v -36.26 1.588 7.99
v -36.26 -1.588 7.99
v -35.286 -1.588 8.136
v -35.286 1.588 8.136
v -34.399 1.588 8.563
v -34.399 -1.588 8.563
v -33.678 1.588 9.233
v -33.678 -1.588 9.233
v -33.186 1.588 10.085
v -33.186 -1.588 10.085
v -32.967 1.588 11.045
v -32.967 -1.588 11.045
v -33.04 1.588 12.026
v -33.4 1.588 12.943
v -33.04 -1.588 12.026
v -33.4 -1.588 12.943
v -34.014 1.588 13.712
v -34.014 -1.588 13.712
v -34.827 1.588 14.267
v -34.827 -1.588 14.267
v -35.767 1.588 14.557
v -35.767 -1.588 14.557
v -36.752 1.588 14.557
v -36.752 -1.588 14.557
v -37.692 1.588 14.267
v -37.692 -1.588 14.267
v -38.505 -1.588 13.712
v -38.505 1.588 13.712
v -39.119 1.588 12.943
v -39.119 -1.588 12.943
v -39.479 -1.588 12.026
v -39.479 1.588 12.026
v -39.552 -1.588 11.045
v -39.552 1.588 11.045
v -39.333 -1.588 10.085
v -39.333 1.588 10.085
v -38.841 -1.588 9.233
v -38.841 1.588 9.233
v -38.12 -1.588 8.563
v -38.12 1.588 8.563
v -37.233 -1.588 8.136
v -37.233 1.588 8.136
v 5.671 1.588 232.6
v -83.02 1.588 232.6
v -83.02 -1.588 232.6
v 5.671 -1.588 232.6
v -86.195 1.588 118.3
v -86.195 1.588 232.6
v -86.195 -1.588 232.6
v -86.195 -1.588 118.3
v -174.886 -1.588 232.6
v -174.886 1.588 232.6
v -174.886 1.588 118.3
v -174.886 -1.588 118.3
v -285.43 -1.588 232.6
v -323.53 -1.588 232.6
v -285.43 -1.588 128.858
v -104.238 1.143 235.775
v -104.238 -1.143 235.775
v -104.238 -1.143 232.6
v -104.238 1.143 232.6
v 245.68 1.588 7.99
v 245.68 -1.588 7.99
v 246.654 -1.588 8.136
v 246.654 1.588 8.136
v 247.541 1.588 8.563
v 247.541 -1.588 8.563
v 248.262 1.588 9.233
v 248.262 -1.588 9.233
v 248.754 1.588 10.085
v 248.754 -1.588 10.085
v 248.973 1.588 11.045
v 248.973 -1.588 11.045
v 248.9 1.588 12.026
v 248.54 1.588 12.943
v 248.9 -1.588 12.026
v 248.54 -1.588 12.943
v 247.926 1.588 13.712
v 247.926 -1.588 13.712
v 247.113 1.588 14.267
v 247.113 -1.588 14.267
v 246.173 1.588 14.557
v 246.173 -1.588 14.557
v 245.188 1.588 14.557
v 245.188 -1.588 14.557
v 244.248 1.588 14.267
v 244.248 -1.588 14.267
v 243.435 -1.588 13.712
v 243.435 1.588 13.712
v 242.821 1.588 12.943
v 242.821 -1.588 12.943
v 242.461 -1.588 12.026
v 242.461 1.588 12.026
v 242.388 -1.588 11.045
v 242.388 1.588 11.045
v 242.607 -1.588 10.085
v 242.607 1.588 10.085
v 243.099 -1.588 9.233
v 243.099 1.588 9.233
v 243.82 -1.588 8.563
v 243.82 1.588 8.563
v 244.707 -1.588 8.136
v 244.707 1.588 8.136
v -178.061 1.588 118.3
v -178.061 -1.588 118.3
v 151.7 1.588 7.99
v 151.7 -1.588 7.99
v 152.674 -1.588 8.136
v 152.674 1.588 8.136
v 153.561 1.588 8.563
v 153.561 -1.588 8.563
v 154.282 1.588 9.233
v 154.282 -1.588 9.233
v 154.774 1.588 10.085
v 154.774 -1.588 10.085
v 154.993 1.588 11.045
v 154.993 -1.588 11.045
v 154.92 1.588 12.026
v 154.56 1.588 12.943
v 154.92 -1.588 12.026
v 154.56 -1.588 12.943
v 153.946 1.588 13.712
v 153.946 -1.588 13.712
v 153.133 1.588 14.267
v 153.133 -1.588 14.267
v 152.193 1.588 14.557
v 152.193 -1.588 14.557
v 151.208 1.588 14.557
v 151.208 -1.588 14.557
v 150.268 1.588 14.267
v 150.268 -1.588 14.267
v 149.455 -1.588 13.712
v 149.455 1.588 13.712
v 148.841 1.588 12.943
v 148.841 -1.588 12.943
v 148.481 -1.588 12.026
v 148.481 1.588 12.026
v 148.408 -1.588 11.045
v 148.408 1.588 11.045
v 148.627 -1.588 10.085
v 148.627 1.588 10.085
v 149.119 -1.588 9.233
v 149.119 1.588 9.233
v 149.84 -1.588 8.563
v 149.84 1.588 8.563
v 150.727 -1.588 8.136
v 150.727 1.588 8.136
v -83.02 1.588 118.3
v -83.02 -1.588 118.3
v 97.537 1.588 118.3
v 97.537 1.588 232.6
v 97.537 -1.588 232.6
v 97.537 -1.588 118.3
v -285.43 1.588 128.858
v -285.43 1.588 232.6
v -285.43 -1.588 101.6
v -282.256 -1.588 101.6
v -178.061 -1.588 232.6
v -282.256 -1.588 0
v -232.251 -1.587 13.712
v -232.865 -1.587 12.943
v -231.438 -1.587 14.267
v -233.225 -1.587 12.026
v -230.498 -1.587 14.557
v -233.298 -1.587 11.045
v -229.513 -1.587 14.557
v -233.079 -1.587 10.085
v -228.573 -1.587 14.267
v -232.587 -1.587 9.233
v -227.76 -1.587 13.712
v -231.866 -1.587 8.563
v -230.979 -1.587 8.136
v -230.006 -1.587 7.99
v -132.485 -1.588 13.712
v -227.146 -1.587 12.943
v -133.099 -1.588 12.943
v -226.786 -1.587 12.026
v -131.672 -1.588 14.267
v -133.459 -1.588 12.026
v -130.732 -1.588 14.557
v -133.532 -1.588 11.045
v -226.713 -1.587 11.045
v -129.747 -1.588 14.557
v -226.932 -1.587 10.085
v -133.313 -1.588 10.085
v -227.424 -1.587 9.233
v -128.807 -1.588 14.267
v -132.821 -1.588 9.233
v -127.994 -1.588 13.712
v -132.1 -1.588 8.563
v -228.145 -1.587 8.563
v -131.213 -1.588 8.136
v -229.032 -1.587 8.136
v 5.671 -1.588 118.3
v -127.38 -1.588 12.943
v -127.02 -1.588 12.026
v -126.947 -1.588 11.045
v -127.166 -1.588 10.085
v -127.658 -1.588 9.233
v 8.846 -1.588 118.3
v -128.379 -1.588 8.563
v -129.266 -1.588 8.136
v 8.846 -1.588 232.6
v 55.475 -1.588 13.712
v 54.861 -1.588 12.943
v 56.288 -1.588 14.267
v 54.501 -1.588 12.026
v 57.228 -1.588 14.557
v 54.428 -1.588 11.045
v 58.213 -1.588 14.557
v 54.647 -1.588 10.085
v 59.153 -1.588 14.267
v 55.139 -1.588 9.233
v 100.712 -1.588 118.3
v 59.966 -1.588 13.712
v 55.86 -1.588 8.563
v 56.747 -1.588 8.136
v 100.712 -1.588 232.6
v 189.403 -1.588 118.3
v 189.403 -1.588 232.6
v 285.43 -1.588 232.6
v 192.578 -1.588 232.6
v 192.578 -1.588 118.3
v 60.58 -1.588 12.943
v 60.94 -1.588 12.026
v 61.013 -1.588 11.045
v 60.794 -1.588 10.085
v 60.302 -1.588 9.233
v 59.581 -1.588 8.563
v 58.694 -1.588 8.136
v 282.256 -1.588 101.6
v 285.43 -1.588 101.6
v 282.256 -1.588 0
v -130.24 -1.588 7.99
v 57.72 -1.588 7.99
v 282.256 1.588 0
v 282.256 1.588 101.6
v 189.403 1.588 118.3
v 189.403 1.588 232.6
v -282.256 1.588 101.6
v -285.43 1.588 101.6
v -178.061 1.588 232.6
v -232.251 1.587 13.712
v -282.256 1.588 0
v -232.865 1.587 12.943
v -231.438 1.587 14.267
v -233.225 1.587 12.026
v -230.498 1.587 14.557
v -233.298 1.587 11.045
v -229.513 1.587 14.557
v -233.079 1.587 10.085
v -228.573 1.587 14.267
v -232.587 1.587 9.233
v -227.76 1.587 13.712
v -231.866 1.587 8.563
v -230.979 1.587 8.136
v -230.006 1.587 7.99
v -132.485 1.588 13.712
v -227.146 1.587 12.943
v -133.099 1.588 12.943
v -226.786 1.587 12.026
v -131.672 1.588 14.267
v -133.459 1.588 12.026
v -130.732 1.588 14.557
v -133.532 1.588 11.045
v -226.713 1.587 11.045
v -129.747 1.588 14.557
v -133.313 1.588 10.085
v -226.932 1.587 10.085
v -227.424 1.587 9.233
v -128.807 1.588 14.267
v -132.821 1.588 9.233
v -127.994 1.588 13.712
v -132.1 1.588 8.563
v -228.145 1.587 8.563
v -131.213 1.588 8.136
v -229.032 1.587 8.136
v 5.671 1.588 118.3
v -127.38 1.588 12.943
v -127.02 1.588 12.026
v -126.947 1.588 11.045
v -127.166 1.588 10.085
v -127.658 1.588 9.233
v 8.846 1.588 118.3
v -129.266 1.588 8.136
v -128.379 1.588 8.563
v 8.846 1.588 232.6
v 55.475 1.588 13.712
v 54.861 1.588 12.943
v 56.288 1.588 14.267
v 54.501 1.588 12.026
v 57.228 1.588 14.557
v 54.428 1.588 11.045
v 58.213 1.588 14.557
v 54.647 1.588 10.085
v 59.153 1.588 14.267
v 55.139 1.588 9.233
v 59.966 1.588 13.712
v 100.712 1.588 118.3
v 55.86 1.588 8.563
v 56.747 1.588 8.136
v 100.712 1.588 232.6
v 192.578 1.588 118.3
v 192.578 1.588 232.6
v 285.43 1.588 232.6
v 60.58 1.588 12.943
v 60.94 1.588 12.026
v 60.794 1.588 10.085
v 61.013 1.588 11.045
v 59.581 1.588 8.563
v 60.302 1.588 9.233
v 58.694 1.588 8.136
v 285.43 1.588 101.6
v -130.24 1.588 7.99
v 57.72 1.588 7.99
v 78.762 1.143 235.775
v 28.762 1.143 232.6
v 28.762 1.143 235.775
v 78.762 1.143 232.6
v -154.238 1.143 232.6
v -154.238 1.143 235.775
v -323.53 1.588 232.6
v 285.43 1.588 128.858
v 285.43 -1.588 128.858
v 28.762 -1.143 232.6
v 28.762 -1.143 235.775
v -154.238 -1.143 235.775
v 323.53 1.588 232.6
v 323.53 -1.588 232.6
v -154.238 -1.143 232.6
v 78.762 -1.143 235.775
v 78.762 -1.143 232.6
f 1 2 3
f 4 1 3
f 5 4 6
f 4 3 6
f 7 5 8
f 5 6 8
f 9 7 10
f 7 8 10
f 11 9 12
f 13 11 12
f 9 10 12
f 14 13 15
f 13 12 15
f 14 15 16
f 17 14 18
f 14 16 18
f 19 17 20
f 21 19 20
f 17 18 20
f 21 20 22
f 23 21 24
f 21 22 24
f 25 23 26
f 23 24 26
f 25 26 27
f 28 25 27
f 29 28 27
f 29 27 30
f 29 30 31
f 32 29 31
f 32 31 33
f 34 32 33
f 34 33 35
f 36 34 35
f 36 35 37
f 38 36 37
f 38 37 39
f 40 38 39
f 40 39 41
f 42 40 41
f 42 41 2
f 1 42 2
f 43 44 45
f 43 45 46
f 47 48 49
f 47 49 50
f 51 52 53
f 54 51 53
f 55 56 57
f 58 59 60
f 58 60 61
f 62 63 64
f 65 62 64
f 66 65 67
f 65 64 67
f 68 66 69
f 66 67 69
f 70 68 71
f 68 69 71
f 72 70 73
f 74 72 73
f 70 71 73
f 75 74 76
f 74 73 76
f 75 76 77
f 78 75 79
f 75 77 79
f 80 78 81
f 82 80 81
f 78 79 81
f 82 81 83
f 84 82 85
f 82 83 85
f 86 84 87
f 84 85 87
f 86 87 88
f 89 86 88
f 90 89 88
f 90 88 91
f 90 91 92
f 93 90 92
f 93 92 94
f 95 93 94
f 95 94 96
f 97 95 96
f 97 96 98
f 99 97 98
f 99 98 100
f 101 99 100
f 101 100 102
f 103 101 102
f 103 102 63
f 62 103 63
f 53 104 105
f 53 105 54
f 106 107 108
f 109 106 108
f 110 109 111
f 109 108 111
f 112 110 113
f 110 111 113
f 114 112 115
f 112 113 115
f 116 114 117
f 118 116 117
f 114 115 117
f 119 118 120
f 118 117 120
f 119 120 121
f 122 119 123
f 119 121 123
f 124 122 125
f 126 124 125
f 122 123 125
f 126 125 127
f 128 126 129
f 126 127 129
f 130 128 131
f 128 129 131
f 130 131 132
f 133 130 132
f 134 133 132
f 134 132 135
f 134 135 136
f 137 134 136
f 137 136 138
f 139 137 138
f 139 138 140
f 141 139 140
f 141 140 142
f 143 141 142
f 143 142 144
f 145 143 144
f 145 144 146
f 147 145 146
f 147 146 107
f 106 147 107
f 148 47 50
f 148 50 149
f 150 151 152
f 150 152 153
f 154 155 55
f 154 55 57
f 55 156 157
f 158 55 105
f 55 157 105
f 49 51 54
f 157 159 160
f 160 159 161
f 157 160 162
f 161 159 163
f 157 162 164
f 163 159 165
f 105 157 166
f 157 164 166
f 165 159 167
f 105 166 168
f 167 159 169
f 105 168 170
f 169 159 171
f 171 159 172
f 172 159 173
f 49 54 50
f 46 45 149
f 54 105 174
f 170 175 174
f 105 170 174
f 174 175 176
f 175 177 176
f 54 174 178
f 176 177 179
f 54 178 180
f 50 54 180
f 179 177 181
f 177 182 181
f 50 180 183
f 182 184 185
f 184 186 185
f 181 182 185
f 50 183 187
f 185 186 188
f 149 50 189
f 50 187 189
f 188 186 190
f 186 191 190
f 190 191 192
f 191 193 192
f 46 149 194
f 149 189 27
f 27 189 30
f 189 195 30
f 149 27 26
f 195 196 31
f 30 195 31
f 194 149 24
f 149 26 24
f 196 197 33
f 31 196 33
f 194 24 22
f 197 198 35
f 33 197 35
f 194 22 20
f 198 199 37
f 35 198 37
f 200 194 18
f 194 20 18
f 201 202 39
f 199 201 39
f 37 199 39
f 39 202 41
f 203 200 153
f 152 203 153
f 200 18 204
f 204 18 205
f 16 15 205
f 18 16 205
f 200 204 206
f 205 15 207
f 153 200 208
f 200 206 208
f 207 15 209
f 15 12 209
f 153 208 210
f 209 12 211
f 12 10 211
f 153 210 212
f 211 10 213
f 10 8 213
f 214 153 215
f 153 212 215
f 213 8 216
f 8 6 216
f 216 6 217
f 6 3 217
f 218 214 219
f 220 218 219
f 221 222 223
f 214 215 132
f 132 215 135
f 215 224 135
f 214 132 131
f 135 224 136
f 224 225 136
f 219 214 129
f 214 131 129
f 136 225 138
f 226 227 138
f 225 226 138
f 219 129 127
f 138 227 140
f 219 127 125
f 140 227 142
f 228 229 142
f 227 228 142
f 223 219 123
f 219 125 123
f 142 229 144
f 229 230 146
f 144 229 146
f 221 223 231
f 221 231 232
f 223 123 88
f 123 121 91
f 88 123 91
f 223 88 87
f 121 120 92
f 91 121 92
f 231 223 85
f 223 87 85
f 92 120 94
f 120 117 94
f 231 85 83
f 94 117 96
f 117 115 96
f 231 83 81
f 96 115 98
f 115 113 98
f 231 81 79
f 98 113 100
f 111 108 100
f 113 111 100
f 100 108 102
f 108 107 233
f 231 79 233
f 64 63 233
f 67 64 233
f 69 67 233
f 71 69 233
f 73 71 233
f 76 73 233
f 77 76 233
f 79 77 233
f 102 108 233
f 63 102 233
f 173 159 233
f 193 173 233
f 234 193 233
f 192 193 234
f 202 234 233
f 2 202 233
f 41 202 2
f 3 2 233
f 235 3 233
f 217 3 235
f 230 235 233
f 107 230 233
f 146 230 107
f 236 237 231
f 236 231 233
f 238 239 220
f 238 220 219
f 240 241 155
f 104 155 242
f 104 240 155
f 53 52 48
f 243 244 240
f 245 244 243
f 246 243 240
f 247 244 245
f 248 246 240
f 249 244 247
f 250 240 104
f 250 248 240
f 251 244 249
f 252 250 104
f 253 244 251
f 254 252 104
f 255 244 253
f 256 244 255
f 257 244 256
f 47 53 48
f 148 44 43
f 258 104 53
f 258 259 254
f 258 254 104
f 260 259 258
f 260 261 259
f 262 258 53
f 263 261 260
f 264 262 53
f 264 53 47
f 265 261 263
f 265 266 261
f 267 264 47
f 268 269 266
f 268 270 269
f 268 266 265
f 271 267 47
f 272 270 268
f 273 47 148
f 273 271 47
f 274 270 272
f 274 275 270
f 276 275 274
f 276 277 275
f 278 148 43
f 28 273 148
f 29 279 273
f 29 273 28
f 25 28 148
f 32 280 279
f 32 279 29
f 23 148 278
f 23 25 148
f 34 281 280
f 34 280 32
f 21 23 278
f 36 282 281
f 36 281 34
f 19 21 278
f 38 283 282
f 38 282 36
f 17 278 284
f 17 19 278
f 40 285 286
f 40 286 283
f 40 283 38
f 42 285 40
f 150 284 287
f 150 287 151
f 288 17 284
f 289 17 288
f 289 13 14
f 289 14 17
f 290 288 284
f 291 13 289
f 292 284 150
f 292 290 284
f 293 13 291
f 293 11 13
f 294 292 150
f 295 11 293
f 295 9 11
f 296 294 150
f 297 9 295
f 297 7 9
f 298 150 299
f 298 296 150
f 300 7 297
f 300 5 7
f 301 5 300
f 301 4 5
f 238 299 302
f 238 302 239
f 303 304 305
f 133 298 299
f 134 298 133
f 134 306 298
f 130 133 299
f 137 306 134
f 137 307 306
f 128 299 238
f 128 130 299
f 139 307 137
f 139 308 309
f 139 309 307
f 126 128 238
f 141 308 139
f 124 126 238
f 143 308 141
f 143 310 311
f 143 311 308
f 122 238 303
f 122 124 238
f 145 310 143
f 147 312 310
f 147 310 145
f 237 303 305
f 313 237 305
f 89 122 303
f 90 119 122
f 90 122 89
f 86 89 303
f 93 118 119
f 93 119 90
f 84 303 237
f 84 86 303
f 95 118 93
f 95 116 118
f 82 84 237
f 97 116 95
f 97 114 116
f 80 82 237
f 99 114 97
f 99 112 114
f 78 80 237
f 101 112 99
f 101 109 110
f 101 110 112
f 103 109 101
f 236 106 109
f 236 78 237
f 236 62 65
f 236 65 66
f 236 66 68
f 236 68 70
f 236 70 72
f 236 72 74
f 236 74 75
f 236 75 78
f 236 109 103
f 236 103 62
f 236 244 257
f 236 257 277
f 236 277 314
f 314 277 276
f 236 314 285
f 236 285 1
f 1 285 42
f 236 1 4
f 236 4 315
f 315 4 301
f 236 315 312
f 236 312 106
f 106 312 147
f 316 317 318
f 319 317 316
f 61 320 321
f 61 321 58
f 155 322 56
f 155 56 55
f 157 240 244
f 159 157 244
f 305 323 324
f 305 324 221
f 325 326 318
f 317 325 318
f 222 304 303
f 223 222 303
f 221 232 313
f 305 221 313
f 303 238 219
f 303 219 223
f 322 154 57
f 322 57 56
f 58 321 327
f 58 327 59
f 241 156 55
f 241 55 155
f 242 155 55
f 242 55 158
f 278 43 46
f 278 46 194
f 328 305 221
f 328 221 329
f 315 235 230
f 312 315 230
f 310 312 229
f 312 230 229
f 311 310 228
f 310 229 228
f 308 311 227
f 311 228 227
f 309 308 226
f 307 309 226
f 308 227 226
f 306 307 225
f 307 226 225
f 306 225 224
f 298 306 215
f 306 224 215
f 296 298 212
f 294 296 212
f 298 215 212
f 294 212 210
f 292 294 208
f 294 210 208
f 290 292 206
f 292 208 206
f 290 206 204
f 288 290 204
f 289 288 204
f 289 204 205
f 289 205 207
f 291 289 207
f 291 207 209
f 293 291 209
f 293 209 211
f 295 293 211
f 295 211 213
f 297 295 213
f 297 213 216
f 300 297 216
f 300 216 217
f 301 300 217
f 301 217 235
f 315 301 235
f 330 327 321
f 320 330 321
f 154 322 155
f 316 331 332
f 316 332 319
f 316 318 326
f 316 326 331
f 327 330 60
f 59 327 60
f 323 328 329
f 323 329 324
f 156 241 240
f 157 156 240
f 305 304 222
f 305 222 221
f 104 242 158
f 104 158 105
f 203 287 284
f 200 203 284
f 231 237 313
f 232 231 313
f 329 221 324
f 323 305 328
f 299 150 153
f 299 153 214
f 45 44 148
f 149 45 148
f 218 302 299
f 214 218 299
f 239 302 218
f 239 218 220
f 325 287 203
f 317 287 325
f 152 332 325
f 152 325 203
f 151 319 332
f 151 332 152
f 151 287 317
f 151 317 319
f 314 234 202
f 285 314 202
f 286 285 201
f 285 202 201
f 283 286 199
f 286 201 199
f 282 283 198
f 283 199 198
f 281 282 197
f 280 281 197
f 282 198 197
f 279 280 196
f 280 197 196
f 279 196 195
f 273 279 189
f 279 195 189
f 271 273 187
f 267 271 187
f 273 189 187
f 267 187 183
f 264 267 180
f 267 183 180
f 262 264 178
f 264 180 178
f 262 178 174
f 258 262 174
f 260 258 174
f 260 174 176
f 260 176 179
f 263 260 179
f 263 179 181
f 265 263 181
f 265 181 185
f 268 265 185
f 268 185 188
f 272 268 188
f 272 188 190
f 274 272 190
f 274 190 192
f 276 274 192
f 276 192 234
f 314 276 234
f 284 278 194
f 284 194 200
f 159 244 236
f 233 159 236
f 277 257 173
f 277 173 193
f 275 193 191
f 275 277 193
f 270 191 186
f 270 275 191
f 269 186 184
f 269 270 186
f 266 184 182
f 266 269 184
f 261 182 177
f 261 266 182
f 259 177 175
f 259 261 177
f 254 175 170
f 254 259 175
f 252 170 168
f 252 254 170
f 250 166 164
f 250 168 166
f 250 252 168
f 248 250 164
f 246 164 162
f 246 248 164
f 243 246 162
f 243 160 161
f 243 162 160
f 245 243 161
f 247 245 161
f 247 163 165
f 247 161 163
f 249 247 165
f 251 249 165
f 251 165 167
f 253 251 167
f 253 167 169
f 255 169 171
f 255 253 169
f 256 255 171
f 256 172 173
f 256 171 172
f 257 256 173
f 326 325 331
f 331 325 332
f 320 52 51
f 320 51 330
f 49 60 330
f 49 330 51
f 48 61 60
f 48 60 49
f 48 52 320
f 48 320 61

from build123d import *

# Parameters (mm, degrees)
SKETCH1_W               = 570.861
SKETCH1_H               = 3.175
BOSS_EXTRUDE1_DEPTH     = 232.6
SKETCH2_W               = 3.175
SKETCH2_H               = 114.3
CUT_EXTRUDE1_DEPTH      = 3.175
SKETCH7_R               = 3.302
CUT_EXTRUDE4_DEPTH      = 369.216527271
SKETCH6_W               = 50
SKETCH6_H               = 2.286
BOSS_EXTRUDE2_DEPTH     = 3.175
LPATTERN1_COUNT         = 5
LPATTERN1_PITCH         = 93.98
BOSS_EXTRUDE4_DEPTH     = 3.175
BOSS_EXTRUDE4_2_DEPTH   = 3.175
LPATTERN2_COUNT         = 5
LPATTERN2_PITCH         = 91.86599991
SKETCH2_4_W             = 3.175
SKETCH2_4_H             = 101.6
CUT_EXTRUDE5_DEPTH      = 401.339750312
CUT_EXTRUDE8_DEPTH      = 401.339750312
CUT_EXTRUDE8_DEPTH_BACK = 401.339750312
SKETCH11_R              = 3.302


with BuildPart() as part:
    # Sketch1 → Boss-Extrude1 (new body)
    with BuildSketch(Plane.XY):
        Rectangle(SKETCH1_W, SKETCH1_H)
    extrude(amount=BOSS_EXTRUDE1_DEPTH)

    # Sketch2 → Cut-Extrude1 (cut)
    with BuildSketch(Plane(origin=(0, 1.5875, 0), x_dir=(1, 0, 0), z_dir=(0, 1, 0))):
        with Locations((-176.4739996, -175.45)):
            Rectangle(SKETCH2_W, SKETCH2_H)
    cut_extrude1 = extrude(amount=-CUT_EXTRUDE1_DEPTH, mode=Mode.SUBTRACT)

    # Sketch7 → Cut-Extrude4 (cut, through all)
    with BuildSketch(Plane(origin=(0, -1.5875, 0), x_dir=(-1, 0, 0), z_dir=(0, -1, 0))):
        with Locations((-245.6805, -11.29165)):
            Circle(SKETCH7_R)
    cut_extrude4 = extrude(amount=-CUT_EXTRUDE4_DEPTH, mode=Mode.SUBTRACT)

    # Sketch6 → Boss-Extrude2 (add)
    with BuildSketch(Plane.XY.offset(232.6)):
        with Locations((53.761993, 0)):
            Rectangle(SKETCH6_W, SKETCH6_H)
        with Locations((-129.238007, 0)):
            Rectangle(SKETCH6_W, SKETCH6_H)
    extrude(amount=BOSS_EXTRUDE2_DEPTH)

    # LPattern1: Cut-Extrude4 ×5
    with Locations(*[(-i * LPATTERN1_PITCH, 0, 0) for i in range(1, LPATTERN1_COUNT)]):
        add(cut_extrude4, mode=Mode.SUBTRACT)

    # LPattern2: Cut-Extrude1 ×5
    with Locations(*[(i * LPATTERN2_PITCH, 0, 0) for i in range(1, LPATTERN2_COUNT)]):
        add(cut_extrude1, mode=Mode.SUBTRACT)

    # Sketch2<4> → Cut-Extrude5 (cut, through all)
    with BuildSketch(Plane(origin=(0, 1.5875, 0), x_dir=(1, 0, 0), z_dir=(0, 1, 0))):
        with Locations((283.843, -50.8)):
            Rectangle(SKETCH2_4_W, SKETCH2_4_H)
        with Locations((-283.843, -50.8)):
            Rectangle(SKETCH2_4_W, SKETCH2_4_H)
    extrude(amount=-CUT_EXTRUDE5_DEPTH, mode=Mode.SUBTRACT)

    # Sketch11 → Cut-Extrude8 (cut, two sides: drawn at the far end of the back side and taken through both)
    with BuildSketch(Plane.XZ.offset(1.5875).offset(-CUT_EXTRUDE8_DEPTH_BACK)):
        with Locations((-230.0055, 11.29165)):
            Circle(SKETCH11_R)
    extrude(amount=CUT_EXTRUDE8_DEPTH + CUT_EXTRUDE8_DEPTH_BACK, mode=Mode.SUBTRACT)


with BuildPart() as body_2:
    # Sketch2<3> → Boss-Extrude4 (new body)
    with BuildSketch(Plane(origin=(0, 1.5875, 0), x_dir=(1, 0, 0), z_dir=(0, 1, 0))):
        Polygon((-323.5305, -232.6), (-285.4305, -232.6), (-285.4305, -128.857841698), align=None)
    extrude(amount=-BOSS_EXTRUDE4_DEPTH)


with BuildPart() as body_3:
    # Sketch2<3> → Boss-Extrude4 2 (new body)
    with BuildSketch(Plane(origin=(0, 1.5875, 0), x_dir=(1, 0, 0), z_dir=(0, 1, 0))):
        Polygon((285.4305, -128.857841698), (285.4305, -232.6), (323.5305, -232.6), align=None)
    extrude(amount=-BOSS_EXTRUDE4_2_DEPTH)


solid = Compound([part.part, body_2.part, body_3.part])
